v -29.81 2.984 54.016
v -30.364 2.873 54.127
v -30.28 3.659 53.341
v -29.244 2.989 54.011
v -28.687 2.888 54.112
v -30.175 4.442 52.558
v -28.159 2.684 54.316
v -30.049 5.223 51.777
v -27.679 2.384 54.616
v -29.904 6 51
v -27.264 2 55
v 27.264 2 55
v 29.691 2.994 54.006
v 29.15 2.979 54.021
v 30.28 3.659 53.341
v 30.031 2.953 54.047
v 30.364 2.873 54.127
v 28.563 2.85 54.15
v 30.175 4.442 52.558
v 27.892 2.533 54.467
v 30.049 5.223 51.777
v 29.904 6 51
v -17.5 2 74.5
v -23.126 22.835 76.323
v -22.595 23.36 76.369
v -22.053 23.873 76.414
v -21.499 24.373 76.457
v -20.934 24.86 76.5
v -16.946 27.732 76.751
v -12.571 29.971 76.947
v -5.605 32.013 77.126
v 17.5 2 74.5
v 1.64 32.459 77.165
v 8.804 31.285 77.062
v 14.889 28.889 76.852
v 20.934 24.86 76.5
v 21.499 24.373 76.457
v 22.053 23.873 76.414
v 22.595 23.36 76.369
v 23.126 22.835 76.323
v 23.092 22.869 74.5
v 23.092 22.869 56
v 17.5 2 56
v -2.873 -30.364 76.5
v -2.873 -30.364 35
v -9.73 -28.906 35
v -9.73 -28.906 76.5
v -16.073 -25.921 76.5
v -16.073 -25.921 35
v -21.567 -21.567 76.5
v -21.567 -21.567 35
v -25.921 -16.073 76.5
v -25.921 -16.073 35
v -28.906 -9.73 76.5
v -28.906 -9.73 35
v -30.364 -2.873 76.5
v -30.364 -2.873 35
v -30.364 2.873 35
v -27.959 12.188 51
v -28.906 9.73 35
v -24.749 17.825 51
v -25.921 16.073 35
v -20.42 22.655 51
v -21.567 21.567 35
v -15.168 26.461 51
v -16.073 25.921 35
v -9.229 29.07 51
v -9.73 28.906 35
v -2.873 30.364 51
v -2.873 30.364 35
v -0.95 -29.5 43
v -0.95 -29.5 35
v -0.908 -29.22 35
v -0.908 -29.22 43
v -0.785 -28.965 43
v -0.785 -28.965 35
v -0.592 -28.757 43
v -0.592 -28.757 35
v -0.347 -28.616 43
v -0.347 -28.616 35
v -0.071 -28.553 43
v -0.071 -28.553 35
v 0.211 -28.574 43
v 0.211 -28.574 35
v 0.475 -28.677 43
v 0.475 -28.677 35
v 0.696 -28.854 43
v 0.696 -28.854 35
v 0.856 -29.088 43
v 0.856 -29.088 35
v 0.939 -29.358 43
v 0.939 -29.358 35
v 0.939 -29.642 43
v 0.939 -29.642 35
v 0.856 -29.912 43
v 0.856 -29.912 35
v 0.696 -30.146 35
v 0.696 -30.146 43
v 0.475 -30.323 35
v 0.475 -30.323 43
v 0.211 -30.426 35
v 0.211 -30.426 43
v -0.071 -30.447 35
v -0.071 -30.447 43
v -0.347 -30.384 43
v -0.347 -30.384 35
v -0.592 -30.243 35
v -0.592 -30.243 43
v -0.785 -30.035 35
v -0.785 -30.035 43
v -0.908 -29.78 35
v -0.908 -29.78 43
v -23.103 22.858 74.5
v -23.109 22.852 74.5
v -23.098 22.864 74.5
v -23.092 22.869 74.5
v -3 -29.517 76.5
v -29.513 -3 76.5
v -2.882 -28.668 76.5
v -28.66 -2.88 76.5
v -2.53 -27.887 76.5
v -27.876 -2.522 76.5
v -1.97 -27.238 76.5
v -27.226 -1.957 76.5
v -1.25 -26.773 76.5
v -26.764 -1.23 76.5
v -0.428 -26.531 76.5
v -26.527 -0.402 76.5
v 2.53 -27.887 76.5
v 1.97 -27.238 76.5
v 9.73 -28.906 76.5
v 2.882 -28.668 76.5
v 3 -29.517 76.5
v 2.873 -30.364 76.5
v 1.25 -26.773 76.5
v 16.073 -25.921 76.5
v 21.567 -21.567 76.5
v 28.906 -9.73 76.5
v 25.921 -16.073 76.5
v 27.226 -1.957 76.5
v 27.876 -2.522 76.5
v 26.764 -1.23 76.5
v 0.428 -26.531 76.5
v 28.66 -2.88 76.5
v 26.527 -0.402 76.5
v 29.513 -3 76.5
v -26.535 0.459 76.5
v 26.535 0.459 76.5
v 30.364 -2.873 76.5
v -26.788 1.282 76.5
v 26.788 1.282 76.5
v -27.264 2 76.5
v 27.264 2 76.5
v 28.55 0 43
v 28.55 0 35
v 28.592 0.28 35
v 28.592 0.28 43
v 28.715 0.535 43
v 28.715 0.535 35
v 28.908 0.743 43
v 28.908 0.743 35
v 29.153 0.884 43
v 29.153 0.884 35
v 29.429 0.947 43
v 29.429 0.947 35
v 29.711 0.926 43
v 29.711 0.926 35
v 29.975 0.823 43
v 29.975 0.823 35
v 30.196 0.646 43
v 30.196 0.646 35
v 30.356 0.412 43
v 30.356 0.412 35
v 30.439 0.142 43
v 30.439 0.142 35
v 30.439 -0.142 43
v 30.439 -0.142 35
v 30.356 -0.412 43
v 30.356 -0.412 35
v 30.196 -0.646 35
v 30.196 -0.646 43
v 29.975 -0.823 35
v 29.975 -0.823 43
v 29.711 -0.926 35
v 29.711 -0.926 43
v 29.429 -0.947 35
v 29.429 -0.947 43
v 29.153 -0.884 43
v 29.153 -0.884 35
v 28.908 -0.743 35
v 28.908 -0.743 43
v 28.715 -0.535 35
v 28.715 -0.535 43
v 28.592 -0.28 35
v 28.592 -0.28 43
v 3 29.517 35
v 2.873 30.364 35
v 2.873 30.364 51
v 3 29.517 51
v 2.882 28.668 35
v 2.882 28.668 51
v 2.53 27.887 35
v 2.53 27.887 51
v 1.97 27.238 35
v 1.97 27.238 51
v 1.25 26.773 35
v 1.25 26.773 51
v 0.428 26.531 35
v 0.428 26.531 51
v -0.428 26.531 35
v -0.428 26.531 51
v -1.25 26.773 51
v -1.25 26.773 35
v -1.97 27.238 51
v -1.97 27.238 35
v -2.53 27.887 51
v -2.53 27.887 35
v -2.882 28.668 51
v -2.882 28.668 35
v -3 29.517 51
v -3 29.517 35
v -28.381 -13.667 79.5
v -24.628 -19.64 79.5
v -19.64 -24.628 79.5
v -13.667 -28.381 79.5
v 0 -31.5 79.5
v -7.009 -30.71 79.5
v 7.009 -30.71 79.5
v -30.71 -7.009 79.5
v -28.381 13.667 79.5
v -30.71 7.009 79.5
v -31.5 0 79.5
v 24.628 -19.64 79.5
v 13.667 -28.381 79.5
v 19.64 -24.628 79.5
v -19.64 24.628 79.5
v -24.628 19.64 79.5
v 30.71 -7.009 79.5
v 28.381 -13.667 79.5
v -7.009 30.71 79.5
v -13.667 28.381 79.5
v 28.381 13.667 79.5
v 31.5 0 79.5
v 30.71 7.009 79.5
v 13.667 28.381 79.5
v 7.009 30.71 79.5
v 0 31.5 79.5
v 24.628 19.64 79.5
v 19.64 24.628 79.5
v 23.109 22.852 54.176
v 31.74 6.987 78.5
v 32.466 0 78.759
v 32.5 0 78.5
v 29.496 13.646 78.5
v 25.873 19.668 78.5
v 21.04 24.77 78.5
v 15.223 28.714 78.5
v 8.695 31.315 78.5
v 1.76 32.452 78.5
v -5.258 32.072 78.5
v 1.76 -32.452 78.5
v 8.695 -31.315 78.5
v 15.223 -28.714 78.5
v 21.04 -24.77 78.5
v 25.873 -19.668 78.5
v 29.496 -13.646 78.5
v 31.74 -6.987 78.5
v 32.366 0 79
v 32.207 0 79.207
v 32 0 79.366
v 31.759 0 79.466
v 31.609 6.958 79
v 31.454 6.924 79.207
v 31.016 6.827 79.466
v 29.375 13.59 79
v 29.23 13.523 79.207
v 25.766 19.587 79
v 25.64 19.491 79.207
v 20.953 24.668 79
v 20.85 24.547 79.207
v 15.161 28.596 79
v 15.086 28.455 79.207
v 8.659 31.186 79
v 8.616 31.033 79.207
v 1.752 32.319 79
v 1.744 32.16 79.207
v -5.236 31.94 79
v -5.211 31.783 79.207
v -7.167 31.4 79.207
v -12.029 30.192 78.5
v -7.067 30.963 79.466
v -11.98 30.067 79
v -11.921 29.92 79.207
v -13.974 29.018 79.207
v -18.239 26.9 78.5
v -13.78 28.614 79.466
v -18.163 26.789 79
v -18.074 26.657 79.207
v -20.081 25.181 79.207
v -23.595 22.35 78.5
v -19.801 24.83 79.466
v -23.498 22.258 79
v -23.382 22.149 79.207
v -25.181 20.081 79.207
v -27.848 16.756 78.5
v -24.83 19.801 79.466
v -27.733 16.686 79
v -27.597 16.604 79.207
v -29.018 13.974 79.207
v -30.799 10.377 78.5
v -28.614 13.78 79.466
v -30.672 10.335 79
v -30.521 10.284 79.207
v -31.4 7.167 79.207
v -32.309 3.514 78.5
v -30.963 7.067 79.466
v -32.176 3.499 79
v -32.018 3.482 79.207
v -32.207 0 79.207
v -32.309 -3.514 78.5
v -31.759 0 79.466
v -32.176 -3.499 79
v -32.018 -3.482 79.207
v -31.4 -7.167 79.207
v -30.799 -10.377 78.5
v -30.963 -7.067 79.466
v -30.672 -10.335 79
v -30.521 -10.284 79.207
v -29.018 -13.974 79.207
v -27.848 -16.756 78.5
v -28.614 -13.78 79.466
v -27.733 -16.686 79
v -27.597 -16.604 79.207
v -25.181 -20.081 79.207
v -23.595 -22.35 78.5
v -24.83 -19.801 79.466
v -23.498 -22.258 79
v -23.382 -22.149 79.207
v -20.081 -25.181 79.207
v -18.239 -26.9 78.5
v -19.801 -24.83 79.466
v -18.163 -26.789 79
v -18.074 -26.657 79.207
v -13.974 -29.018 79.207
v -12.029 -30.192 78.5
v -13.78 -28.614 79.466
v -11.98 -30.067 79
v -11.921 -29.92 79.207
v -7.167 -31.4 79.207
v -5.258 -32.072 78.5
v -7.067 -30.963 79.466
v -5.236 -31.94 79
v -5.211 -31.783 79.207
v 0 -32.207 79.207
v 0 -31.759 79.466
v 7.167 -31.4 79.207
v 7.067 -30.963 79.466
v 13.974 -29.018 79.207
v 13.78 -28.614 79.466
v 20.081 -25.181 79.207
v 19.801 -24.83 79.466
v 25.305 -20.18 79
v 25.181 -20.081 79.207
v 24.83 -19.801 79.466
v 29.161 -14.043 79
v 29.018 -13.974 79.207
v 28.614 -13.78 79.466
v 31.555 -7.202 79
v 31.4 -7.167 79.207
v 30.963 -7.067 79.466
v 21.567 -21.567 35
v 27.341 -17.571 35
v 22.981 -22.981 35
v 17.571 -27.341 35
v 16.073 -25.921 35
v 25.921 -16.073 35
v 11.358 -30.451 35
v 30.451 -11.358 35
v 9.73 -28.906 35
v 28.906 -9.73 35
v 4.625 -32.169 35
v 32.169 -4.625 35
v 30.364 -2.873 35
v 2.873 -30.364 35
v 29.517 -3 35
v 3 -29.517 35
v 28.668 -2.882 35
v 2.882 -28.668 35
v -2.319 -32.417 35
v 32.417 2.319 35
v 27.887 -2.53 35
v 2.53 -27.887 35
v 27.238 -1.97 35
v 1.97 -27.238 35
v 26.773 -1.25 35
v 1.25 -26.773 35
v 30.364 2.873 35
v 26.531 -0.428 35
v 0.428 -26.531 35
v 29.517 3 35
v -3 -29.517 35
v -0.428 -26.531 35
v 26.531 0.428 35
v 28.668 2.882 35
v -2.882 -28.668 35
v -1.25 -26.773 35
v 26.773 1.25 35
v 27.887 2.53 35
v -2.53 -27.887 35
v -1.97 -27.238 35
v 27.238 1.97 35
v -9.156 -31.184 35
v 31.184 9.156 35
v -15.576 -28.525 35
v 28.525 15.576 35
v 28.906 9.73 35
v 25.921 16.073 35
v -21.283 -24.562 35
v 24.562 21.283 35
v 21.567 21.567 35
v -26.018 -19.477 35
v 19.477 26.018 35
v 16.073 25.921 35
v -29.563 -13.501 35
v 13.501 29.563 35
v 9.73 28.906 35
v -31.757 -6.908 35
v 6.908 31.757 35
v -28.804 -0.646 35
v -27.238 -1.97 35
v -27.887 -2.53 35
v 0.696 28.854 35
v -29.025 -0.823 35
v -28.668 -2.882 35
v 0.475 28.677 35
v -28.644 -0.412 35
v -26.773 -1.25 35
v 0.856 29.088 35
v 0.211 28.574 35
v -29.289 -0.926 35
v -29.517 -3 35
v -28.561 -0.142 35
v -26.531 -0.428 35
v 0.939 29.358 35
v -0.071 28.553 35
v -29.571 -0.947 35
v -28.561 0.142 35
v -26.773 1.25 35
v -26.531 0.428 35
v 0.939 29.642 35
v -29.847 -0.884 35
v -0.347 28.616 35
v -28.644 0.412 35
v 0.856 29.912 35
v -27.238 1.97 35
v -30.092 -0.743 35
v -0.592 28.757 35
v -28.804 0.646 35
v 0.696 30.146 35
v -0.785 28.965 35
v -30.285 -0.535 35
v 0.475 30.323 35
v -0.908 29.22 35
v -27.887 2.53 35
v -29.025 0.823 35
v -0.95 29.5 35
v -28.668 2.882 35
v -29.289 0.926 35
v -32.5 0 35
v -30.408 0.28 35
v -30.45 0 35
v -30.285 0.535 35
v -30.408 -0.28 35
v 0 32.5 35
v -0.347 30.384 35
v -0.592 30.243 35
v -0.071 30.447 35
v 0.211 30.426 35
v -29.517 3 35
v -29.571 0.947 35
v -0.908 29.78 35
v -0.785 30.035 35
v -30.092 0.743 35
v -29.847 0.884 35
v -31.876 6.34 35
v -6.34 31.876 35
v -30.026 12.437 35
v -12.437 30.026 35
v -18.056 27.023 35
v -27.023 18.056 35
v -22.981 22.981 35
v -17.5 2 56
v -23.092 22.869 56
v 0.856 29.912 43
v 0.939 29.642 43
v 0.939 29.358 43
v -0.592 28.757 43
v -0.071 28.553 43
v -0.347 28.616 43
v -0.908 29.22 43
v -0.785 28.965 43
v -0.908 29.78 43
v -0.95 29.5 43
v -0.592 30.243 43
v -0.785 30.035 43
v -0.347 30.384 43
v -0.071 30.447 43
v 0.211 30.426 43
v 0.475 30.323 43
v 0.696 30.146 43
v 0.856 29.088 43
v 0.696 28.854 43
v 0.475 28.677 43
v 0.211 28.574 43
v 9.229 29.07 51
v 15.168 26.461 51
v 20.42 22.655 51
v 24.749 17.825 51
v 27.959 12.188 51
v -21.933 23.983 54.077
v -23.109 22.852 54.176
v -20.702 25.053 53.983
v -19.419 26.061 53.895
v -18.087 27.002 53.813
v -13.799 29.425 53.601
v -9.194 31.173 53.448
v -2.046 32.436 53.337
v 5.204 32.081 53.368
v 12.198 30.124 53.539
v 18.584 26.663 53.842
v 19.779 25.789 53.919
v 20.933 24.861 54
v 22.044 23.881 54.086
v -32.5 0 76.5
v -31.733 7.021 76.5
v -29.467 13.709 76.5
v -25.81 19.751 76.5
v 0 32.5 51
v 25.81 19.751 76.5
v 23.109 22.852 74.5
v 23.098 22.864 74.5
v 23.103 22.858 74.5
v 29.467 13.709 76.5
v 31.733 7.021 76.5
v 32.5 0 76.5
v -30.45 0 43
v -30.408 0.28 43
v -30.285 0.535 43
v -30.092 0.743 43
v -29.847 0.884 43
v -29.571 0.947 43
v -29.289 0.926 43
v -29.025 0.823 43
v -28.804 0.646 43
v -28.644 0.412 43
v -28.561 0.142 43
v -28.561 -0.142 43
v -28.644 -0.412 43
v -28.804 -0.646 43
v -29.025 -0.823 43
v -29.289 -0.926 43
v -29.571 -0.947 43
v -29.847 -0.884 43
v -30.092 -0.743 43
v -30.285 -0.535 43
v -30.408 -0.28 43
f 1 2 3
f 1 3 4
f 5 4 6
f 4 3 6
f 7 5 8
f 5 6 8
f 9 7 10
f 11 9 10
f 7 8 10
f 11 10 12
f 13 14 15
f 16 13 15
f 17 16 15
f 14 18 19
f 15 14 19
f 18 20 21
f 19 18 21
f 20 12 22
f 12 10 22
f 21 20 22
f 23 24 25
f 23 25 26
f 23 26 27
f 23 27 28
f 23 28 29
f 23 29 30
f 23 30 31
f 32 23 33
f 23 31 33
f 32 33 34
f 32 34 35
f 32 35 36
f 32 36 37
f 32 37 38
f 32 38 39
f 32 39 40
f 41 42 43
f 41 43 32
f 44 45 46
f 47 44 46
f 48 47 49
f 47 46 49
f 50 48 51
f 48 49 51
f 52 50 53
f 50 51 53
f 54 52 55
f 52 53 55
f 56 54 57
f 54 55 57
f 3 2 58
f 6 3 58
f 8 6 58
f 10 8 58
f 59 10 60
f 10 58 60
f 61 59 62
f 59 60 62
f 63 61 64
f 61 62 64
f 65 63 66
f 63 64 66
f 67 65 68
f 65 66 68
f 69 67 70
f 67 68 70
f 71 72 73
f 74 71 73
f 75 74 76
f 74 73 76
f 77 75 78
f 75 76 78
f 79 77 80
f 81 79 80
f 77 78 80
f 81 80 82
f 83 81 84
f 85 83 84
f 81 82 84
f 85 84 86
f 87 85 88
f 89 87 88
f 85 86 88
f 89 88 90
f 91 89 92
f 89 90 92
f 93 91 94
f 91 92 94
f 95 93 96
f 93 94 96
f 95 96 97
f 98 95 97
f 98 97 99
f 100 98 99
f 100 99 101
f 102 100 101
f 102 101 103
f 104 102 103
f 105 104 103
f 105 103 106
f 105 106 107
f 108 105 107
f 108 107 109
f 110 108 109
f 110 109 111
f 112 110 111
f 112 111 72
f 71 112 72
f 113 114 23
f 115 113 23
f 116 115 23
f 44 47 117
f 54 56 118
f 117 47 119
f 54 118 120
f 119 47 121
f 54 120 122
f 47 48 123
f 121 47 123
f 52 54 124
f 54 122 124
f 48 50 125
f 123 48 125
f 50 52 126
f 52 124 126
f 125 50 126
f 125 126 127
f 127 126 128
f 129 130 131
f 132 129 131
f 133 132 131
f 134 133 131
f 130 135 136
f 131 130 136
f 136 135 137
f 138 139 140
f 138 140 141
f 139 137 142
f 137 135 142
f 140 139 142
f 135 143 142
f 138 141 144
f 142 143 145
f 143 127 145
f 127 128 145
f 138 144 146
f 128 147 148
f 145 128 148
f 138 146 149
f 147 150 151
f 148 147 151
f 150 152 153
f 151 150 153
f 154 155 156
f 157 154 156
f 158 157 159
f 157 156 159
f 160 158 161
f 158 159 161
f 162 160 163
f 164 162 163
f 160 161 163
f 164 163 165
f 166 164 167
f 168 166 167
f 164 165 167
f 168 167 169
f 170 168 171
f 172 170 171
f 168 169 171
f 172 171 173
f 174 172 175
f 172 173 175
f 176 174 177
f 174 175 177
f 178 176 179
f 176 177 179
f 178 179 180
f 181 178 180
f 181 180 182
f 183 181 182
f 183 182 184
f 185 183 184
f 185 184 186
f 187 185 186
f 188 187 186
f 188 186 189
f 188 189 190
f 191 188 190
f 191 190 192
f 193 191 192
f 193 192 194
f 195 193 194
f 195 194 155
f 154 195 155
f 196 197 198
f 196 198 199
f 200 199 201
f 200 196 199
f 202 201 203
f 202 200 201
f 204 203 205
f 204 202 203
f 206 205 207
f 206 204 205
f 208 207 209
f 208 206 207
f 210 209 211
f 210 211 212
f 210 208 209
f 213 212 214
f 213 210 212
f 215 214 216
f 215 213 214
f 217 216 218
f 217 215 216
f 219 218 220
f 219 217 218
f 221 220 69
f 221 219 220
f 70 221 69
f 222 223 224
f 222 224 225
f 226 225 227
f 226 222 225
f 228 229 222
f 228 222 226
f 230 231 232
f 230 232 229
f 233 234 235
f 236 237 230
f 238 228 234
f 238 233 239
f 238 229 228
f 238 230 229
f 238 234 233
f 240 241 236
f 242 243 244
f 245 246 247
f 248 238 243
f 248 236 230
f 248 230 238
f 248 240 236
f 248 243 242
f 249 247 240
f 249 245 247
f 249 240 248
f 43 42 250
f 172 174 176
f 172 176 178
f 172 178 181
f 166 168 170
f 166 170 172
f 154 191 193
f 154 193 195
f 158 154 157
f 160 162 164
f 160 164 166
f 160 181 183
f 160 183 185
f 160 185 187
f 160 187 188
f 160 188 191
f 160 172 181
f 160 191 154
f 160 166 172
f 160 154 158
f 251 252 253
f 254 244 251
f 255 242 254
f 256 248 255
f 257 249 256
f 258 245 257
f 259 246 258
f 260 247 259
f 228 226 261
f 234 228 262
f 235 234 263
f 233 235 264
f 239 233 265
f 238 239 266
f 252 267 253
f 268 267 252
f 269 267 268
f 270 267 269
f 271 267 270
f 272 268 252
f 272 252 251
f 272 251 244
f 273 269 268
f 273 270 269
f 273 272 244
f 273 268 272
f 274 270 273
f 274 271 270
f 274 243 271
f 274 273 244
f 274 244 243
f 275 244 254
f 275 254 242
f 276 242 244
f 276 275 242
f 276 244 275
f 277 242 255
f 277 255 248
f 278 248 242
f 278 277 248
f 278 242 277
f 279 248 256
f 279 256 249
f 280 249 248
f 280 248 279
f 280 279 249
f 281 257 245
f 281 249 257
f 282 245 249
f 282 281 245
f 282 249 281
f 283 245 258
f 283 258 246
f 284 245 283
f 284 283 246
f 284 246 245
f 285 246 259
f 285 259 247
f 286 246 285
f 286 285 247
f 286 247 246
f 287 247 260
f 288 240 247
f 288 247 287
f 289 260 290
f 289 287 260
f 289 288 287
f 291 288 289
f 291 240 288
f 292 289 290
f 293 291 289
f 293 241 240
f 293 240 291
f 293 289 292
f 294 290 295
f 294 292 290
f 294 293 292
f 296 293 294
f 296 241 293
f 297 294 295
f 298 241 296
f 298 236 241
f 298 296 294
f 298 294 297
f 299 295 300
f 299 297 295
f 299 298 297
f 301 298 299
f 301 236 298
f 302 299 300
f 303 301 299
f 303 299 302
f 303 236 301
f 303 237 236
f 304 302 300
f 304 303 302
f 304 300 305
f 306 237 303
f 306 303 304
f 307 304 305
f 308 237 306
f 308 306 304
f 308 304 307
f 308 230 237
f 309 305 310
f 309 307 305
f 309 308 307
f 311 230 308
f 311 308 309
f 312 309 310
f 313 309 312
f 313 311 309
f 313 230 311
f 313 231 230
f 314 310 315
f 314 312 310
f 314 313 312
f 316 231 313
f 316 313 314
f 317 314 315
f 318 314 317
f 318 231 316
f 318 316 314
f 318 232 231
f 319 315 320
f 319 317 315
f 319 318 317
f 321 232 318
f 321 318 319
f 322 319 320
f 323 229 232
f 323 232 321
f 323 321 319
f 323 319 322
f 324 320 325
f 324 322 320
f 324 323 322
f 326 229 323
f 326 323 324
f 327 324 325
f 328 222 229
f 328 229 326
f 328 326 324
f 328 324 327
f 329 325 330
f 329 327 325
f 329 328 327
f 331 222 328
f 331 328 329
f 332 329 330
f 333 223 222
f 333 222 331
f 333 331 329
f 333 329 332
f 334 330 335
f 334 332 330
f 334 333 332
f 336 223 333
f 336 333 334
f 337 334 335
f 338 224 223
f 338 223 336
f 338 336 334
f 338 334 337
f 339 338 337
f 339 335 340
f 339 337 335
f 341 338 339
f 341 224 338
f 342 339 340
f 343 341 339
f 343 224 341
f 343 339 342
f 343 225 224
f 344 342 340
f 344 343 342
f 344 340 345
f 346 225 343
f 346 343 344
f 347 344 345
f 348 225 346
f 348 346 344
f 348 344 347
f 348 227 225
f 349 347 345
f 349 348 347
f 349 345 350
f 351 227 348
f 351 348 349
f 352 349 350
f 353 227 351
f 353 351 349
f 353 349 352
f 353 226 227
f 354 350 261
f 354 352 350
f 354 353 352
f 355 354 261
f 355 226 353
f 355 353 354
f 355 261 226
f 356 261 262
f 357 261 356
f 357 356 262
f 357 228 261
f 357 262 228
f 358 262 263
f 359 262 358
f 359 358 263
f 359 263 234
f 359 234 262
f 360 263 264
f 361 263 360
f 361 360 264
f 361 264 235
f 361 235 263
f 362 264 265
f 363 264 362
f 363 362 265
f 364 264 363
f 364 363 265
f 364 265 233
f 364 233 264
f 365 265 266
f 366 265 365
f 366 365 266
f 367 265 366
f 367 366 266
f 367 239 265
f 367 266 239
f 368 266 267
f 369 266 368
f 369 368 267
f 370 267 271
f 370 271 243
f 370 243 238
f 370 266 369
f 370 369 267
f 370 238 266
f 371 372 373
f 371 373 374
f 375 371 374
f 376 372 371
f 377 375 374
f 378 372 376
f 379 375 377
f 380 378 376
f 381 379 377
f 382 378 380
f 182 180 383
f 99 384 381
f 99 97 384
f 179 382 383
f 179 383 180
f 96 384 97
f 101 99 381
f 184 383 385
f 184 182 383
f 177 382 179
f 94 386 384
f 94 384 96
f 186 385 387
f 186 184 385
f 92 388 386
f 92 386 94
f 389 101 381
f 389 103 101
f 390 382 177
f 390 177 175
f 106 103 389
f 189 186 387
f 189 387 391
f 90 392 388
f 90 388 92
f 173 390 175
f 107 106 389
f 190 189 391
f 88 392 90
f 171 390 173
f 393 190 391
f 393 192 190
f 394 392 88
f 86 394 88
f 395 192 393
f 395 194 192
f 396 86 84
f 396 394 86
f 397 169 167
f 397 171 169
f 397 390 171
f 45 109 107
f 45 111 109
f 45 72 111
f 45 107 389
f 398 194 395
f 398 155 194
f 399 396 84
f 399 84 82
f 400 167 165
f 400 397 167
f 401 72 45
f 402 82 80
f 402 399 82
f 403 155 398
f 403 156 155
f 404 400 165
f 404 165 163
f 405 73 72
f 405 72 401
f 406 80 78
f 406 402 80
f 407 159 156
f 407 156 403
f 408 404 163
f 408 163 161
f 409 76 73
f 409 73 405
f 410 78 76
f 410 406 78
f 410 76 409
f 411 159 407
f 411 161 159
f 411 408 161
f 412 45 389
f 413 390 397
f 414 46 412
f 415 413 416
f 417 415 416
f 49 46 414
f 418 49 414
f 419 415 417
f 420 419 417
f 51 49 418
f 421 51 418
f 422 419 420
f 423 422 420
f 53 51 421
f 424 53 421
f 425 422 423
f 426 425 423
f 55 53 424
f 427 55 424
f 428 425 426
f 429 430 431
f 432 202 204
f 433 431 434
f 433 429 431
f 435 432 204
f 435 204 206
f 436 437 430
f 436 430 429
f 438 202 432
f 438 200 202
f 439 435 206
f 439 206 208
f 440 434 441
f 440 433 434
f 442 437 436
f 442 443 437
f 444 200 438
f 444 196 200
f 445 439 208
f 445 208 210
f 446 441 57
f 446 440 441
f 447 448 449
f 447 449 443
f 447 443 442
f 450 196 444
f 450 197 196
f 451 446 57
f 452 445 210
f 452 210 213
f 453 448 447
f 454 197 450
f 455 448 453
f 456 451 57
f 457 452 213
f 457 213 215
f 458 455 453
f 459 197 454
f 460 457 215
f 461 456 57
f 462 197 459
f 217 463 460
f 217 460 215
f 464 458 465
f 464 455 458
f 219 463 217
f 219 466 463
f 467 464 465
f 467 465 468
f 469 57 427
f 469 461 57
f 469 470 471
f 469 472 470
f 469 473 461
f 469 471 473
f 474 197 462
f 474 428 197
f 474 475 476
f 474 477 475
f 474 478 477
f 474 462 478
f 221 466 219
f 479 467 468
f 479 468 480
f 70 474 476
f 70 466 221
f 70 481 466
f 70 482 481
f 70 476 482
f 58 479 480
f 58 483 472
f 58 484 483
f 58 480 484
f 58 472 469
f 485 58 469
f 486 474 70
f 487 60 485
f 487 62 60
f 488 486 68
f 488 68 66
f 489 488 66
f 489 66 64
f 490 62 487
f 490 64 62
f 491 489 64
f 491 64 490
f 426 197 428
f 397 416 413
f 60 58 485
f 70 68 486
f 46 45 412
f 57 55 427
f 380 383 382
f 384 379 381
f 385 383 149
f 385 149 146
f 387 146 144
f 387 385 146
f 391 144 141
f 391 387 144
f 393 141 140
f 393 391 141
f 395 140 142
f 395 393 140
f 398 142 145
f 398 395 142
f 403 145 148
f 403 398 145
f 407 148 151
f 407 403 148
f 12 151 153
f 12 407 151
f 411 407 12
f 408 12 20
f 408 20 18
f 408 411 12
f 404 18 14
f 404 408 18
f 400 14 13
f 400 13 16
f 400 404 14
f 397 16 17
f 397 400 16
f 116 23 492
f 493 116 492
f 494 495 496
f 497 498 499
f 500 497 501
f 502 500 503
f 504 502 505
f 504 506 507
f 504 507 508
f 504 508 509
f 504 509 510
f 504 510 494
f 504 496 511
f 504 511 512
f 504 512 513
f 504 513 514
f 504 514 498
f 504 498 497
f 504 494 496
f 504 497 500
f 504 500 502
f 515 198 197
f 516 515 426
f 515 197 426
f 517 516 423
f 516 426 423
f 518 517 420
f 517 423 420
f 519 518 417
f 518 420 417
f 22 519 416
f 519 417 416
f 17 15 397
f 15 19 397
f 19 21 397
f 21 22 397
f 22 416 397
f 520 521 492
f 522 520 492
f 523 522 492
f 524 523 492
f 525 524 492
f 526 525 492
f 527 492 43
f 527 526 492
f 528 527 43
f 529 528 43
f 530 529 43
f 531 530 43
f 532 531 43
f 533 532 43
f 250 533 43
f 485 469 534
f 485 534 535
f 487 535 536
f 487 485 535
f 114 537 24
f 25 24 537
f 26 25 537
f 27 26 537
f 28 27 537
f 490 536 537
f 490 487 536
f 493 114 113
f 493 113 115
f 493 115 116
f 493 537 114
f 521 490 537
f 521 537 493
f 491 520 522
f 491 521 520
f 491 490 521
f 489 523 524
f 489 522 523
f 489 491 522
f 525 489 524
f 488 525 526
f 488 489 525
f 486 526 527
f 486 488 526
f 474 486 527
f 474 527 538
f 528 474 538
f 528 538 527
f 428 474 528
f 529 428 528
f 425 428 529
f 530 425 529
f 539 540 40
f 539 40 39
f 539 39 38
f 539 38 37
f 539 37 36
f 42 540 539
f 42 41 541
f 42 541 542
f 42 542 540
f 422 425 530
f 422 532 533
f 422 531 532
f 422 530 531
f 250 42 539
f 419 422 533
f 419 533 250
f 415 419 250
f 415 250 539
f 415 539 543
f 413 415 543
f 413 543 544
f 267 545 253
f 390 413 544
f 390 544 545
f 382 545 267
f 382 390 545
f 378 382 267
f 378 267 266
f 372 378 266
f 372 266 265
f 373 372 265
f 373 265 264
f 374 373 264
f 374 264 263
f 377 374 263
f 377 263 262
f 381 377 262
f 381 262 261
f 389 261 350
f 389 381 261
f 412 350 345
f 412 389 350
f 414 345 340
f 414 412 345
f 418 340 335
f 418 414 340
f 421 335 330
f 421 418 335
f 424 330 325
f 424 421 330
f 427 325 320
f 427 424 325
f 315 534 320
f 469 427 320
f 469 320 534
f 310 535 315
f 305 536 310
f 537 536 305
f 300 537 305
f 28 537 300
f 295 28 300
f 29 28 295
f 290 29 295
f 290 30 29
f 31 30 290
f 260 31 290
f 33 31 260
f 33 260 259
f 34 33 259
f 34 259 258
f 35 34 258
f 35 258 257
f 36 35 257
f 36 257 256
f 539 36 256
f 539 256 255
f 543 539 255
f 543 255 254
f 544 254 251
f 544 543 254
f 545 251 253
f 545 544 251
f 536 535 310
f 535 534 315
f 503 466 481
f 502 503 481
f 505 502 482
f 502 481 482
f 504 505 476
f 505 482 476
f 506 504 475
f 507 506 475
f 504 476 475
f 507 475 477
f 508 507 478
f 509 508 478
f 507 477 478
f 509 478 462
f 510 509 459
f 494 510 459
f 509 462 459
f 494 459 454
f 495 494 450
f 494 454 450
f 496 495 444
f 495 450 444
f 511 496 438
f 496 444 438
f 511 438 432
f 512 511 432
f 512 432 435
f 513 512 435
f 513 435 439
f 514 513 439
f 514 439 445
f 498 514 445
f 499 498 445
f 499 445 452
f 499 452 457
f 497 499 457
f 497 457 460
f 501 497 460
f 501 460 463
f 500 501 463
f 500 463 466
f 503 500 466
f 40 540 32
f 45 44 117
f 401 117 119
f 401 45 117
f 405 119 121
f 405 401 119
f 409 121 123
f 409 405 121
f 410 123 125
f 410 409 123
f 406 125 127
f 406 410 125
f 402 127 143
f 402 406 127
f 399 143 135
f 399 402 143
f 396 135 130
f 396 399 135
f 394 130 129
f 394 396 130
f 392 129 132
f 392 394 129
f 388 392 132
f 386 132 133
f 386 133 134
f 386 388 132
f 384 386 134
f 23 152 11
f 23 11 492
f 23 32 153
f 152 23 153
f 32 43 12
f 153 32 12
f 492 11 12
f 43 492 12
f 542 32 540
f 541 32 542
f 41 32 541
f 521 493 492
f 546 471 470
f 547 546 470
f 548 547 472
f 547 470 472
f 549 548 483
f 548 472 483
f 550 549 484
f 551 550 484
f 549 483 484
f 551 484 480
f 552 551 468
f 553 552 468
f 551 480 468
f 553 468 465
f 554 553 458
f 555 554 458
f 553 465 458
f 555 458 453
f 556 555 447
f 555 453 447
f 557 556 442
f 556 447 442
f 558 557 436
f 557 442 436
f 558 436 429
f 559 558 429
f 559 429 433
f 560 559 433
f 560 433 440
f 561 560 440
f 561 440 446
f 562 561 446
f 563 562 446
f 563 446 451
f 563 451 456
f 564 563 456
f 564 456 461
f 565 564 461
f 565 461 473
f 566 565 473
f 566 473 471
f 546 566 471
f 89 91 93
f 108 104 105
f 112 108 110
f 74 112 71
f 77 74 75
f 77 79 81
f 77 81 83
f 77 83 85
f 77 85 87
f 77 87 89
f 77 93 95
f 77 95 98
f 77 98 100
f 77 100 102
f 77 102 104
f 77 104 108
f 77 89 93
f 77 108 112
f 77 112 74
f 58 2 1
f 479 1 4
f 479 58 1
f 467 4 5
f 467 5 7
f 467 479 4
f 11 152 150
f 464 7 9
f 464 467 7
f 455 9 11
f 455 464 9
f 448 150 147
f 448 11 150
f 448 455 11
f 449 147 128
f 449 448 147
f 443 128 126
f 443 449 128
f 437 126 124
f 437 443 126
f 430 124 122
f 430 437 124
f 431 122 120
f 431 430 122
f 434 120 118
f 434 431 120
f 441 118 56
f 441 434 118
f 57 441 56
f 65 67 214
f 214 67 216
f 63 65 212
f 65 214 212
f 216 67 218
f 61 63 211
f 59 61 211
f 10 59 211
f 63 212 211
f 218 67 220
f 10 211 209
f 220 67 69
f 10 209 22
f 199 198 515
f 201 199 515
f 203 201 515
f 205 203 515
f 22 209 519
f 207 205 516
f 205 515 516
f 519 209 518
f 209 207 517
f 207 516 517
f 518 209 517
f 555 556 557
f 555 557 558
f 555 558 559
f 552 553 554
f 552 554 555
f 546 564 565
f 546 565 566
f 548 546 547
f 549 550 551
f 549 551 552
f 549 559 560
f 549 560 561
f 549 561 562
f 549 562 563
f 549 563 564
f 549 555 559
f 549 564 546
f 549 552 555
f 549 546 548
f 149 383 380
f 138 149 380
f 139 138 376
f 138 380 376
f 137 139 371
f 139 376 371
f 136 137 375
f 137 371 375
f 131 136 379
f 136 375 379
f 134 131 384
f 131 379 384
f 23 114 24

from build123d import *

# Parameters (mm, degrees)
SKETCH_2_R           = 32.5
EXTRUDE_1_DEPTH      = 3
EXTRUDE_START        = 43.5
SKETCH_3_R           = 32.5
SKETCH_3_R_2         = 30.5
EXTRUDE_2_DEPTH      = 43.5
SKETCH_4_W           = 35
SKETCH_4_H           = 18.5
CUT_EXTRUDE_1_DEPTH  = 52
EXTRUDE_3_REACH      = 93.83
EXTRUDE_3_END_RADIUS = 30.5
SKETCH_5_W           = 41
SKETCH_5_H           = 22.5
SKETCH_5_W_2         = 35
SKETCH_5_H_2         = 18.5
SKETCH_9_W           = 43.61428081
SKETCH_9_H           = 23.224697296
CUT_EXTRUDE_2_DEPTH  = 2
EXTRUDE_4_DEPTH      = 22.5
SKETCH_11_W          = 18.5
SKETCH_11_H          = 36.291622976
CUT_REVOLVE_1_ANGLE  = 15
SKETCH_12_W          = 18.5
SKETCH_12_H          = 37.014975327
CUT_REVOLVE_2_ANGLE  = 15
CUT_REVOLVE_3_ANGLE  = 5
CUT_REVOLVE_4_ANGLE  = 5
EXTRUDE_START_2      = 3
EXTRUDE_5_DEPTH      = 3
SKETCH_17_W          = 36.670628391
SKETCH_17_H          = 24.683517756
CUT_EXTRUDE_3_DEPTH  = 3
CHAMFER_1_SIZE       = 4
FILLET_1_R           = 1
EXTRUDE_6_REACH      = 67.382
SKETCH_18_R          = 3
SKETCH_19_R          = 3
EXTRUDE_7_DEPTH      = 18
SKETCH_20_R          = 0.95
CUT_EXTRUDE_4_DEPTH  = 10
SKETCH_21_R          = 44.197984087
CUT_EXTRUDE_5_DEPTH  = 2


with BuildPart() as part:
    # 草图2 → 凸台-拉伸1 (new body)
    with BuildSketch(Plane.XY.offset(76.5)):
        Circle(SKETCH_2_R)
    extrude(amount=EXTRUDE_1_DEPTH)

    # 草图3 → 凸台-拉伸2 (add)
    with BuildSketch(Plane(origin=(0, 0, 76.5), x_dir=(-1, 0, 0), z_dir=(0, 0, -1)).offset(EXTRUDE_START)):
        Circle(SKETCH_3_R)
        Circle(SKETCH_3_R_2, mode=Mode.SUBTRACT)
    extrude(amount=-EXTRUDE_2_DEPTH)

    # 草图4 → 切除-拉伸1 (cut)
    with BuildSketch(Plane(origin=(0, 0, 0), x_dir=(1, 0, 0), z_dir=(0, 1, 0))):
        with Locations((0, -65.25)):
            Rectangle(SKETCH_4_W, SKETCH_4_H)
    extrude(amount=CUT_EXTRUDE_1_DEPTH, mode=Mode.SUBTRACT)

    # 凸台-拉伸3: up to this cylinder (the profile starts inside it)
    extrude_3_end = Plane(origin=(0, 0, 54.46768), z_dir=(0, 0, 1)) * Cylinder(EXTRUDE_3_END_RADIUS, 249.66, mode=Mode.PRIVATE)
    # 草图5 → 凸台-拉伸3 (add, up to the surface)
    with BuildSketch(Plane(origin=(0, 0, 0), x_dir=(1, 0, 0), z_dir=(0, 1, 0)), mode=Mode.PRIVATE) as extrude_3_sk1:
        with Locations((0, -65.25)):
            Rectangle(SKETCH_5_W, SKETCH_5_H)
        with Locations((0, -65.25)):
            Rectangle(SKETCH_5_W_2, SKETCH_5_H_2, mode=Mode.SUBTRACT)
    extrude_3_tool1 = extrude(extrude_3_sk1.sketch, amount=EXTRUDE_3_REACH, mode=Mode.PRIVATE) & extrude_3_end
    add(extrude_3_tool1.solids().sort_by_distance((0, 0, 54.46768))[0])

    # 草图9 → 切除-拉伸2 (cut)
    with BuildSketch(Plane.XZ):
        with Locations((0, 64.887651352)):
            Rectangle(SKETCH_9_W, SKETCH_9_H)
    extrude(amount=-CUT_EXTRUDE_2_DEPTH, mode=Mode.SUBTRACT)

    # 草图10 → 凸台-拉伸4 (add)
    with BuildSketch(Plane(origin=(0, 0, 54), x_dir=(-1, 0, 0), z_dir=(0, 0, -1))):
        with BuildLine():
            Line((20.5, 2), (30.434355587, 2))
            ThreePointArc((30.434355587, 2), (27.468053538, 13.257301189), (20.5, 22.583179581))
            Line((20.5, 22.583179581), (20.5, 2))
        make_face()
        with BuildLine():
            Line((-20.5, 2), (-30.434355587, 2))
            ThreePointArc((-30.434355587, 2), (-27.468053538, 13.257301189), (-20.5, 22.583179581))
            Line((-20.5, 22.583179581), (-20.5, 2))
        make_face()
    extrude(amount=-EXTRUDE_4_DEPTH)

    # 草图11 → 切除-旋转1 (revolve, cut)
    with BuildSketch(Plane.ZY.offset(-17.5)):
        with Locations((65.25, 20.145811488)):
            Rectangle(SKETCH_11_W, SKETCH_11_H)
    revolve(axis=Axis((17.5, 2, 81.98075626), (0, 0, -1)), revolution_arc=CUT_REVOLVE_1_ANGLE, mode=Mode.SUBTRACT)

    # 草图12 → 切除-旋转2 (revolve, cut)
    with BuildSketch(Plane(origin=(-17.5, 0, 0), x_dir=(0, 0, -1), z_dir=(1, 0, 0))):
        with Locations((-65.25, 20.507487664)):
            Rectangle(SKETCH_12_W, SKETCH_12_H)
    revolve(axis=Axis((-17.5, 2, 82.239096386), (0, 0, 1)), revolution_arc=CUT_REVOLVE_2_ANGLE, mode=Mode.SUBTRACT)

    # 草图13 → 切除-旋转3 (revolve, cut)
    with BuildSketch(Plane.XY.offset(56)):
        Polygon((-17.5, 2), (17.5, 2), (26.341893189, 34.998394615), (-26.341893189, 34.998394615), align=None)
    revolve(axis=Axis((-38.580818274, 2, 56), (-1, 0, 0)), revolution_arc=CUT_REVOLVE_3_ANGLE, mode=Mode.SUBTRACT)

    # 草图14 → 切除-旋转4 (revolve, cut)
    with BuildSketch(Plane(origin=(0, 0, 74.5), x_dir=(-1, 0, 0), z_dir=(0, 0, -1))):
        Polygon((17.5, 2), (-17.5, 2), (-26.592656258, 35.805125046), (26.592656258, 35.805125046), align=None)
    revolve(axis=Axis((-42.793281967, 2, 74.5), (1, 0, 0)), revolution_arc=CUT_REVOLVE_4_ANGLE, mode=Mode.SUBTRACT)

    # 草图15 → 凸台-拉伸5 (add)
    with BuildSketch(Plane(origin=(0, 0, 54), x_dir=(-1, 0, 0), z_dir=(0, 0, -1)).offset(EXTRUDE_START_2)):
        with BuildLine():
            Line((30.434355587, 2), (-30.434355587, 2))
            ThreePointArc((-30.434355587, 2), (0, 30.5), (30.434355587, 2))
        make_face()
    extrude(amount=-EXTRUDE_5_DEPTH)

    # 草图17 → 切除-拉伸3 (cut)
    with BuildSketch(Plane(origin=(0, 4.877341222, 55.748265262), x_dir=(1, 0, 0), z_dir=(0, 0.08715574274765839, 0.9961946980917457))):
        with Locations((0.24825377, 21.222934692)):
            Rectangle(SKETCH_17_W, SKETCH_17_H)
    extrude(amount=CUT_EXTRUDE_3_DEPTH, mode=Mode.SUBTRACT)

    # 倒角1
    chamfer_1_edges = [part.edges().sort_by_distance(p)[0] for p in [
        (0, 2, 51),
    ]]
    chamfer(chamfer_1_edges, length=CHAMFER_1_SIZE)

    # 圆角1
    fillet_1_edges = [part.edges().sort_by_distance(p)[0] for p in [
        (-32.5, 0, 79.5),
    ]]
    fillet(fillet_1_edges, radius=FILLET_1_R)

    # 凸台-拉伸6: up to this face of the body (flat: up to its plane)
    extrude_6_end = Plane(part.part.faces().sort_by_distance((0, -11.870804721, 76.5))[0])
    # 草图18 → 凸台-拉伸6 (add, up to the picked face)
    with BuildSketch(Plane(origin=(0, 0, 33), x_dir=(-1, 0, 0), z_dir=(0, 0, -1)), mode=Mode.PRIVATE) as extrude_6_sk1:
        with Locations((-29.5, 0)):
            Circle(SKETCH_18_R)
    extrude_6_tool1 = split(extrude(extrude_6_sk1.sketch, amount=-EXTRUDE_6_REACH, mode=Mode.PRIVATE), bisect_by=extrude_6_end, keep=Keep.BOTH, mode=Mode.PRIVATE)
    # 草图18 → 凸台-拉伸6 (add, up to the picked face)
    with BuildSketch(Plane(origin=(0, 0, 33), x_dir=(-1, 0, 0), z_dir=(0, 0, -1)), mode=Mode.PRIVATE) as extrude_6_sk2:
        with Locations((0, -29.5)):
            Circle(SKETCH_18_R)
    extrude_6_tool2 = split(extrude(extrude_6_sk2.sketch, amount=-EXTRUDE_6_REACH, mode=Mode.PRIVATE), bisect_by=extrude_6_end, keep=Keep.BOTH, mode=Mode.PRIVATE)
    # 草图18 → 凸台-拉伸6 (add, up to the picked face)
    with BuildSketch(Plane(origin=(0, 0, 33), x_dir=(-1, 0, 0), z_dir=(0, 0, -1)), mode=Mode.PRIVATE) as extrude_6_sk3:
        with Locations((29.5, 0)):
            Circle(SKETCH_18_R)
    extrude_6_tool3 = split(extrude(extrude_6_sk3.sketch, amount=-EXTRUDE_6_REACH, mode=Mode.PRIVATE), bisect_by=extrude_6_end, keep=Keep.BOTH, mode=Mode.PRIVATE)
    add(extrude_6_tool1.solids().sort_by(Axis((29.5, 0, 33), (0, 0, 1)))[0])
    add(extrude_6_tool2.solids().sort_by(Axis((0, -29.5, 33), (0, 0, 1)))[0])
    add(extrude_6_tool3.solids().sort_by(Axis((-29.5, 0, 33), (0, 0, 1)))[0])

    # 草图19 → 凸台-拉伸7 (add)
    with BuildSketch(Plane(origin=(0, 0, 33), x_dir=(-1, 0, 0), z_dir=(0, 0, -1))):
        with Locations((0, 29.5)):
            Circle(SKETCH_19_R)
    extrude(amount=-EXTRUDE_7_DEPTH)

    # 草图20 → 切除-拉伸4 (cut)
    with BuildSketch(Plane(origin=(0, 0, 33), x_dir=(-1, 0, 0), z_dir=(0, 0, -1))):
        with Locations((0, -29.5)):
            Circle(SKETCH_20_R)
        with Locations((29.5, 0)):
            Circle(SKETCH_20_R)
        with Locations((0, 29.5)):
            Circle(SKETCH_20_R)
        with Locations((-29.5, 0)):
            Circle(SKETCH_20_R)
    extrude(amount=-CUT_EXTRUDE_4_DEPTH, mode=Mode.SUBTRACT)

    # 草图21 → 切除-拉伸5 (cut)
    with BuildSketch(Plane(origin=(0, 0, 33), x_dir=(-1, 0, 0), z_dir=(0, 0, -1))):
        Circle(SKETCH_21_R)
    extrude(amount=-CUT_EXTRUDE_5_DEPTH, mode=Mode.SUBTRACT)


solid = part.part
